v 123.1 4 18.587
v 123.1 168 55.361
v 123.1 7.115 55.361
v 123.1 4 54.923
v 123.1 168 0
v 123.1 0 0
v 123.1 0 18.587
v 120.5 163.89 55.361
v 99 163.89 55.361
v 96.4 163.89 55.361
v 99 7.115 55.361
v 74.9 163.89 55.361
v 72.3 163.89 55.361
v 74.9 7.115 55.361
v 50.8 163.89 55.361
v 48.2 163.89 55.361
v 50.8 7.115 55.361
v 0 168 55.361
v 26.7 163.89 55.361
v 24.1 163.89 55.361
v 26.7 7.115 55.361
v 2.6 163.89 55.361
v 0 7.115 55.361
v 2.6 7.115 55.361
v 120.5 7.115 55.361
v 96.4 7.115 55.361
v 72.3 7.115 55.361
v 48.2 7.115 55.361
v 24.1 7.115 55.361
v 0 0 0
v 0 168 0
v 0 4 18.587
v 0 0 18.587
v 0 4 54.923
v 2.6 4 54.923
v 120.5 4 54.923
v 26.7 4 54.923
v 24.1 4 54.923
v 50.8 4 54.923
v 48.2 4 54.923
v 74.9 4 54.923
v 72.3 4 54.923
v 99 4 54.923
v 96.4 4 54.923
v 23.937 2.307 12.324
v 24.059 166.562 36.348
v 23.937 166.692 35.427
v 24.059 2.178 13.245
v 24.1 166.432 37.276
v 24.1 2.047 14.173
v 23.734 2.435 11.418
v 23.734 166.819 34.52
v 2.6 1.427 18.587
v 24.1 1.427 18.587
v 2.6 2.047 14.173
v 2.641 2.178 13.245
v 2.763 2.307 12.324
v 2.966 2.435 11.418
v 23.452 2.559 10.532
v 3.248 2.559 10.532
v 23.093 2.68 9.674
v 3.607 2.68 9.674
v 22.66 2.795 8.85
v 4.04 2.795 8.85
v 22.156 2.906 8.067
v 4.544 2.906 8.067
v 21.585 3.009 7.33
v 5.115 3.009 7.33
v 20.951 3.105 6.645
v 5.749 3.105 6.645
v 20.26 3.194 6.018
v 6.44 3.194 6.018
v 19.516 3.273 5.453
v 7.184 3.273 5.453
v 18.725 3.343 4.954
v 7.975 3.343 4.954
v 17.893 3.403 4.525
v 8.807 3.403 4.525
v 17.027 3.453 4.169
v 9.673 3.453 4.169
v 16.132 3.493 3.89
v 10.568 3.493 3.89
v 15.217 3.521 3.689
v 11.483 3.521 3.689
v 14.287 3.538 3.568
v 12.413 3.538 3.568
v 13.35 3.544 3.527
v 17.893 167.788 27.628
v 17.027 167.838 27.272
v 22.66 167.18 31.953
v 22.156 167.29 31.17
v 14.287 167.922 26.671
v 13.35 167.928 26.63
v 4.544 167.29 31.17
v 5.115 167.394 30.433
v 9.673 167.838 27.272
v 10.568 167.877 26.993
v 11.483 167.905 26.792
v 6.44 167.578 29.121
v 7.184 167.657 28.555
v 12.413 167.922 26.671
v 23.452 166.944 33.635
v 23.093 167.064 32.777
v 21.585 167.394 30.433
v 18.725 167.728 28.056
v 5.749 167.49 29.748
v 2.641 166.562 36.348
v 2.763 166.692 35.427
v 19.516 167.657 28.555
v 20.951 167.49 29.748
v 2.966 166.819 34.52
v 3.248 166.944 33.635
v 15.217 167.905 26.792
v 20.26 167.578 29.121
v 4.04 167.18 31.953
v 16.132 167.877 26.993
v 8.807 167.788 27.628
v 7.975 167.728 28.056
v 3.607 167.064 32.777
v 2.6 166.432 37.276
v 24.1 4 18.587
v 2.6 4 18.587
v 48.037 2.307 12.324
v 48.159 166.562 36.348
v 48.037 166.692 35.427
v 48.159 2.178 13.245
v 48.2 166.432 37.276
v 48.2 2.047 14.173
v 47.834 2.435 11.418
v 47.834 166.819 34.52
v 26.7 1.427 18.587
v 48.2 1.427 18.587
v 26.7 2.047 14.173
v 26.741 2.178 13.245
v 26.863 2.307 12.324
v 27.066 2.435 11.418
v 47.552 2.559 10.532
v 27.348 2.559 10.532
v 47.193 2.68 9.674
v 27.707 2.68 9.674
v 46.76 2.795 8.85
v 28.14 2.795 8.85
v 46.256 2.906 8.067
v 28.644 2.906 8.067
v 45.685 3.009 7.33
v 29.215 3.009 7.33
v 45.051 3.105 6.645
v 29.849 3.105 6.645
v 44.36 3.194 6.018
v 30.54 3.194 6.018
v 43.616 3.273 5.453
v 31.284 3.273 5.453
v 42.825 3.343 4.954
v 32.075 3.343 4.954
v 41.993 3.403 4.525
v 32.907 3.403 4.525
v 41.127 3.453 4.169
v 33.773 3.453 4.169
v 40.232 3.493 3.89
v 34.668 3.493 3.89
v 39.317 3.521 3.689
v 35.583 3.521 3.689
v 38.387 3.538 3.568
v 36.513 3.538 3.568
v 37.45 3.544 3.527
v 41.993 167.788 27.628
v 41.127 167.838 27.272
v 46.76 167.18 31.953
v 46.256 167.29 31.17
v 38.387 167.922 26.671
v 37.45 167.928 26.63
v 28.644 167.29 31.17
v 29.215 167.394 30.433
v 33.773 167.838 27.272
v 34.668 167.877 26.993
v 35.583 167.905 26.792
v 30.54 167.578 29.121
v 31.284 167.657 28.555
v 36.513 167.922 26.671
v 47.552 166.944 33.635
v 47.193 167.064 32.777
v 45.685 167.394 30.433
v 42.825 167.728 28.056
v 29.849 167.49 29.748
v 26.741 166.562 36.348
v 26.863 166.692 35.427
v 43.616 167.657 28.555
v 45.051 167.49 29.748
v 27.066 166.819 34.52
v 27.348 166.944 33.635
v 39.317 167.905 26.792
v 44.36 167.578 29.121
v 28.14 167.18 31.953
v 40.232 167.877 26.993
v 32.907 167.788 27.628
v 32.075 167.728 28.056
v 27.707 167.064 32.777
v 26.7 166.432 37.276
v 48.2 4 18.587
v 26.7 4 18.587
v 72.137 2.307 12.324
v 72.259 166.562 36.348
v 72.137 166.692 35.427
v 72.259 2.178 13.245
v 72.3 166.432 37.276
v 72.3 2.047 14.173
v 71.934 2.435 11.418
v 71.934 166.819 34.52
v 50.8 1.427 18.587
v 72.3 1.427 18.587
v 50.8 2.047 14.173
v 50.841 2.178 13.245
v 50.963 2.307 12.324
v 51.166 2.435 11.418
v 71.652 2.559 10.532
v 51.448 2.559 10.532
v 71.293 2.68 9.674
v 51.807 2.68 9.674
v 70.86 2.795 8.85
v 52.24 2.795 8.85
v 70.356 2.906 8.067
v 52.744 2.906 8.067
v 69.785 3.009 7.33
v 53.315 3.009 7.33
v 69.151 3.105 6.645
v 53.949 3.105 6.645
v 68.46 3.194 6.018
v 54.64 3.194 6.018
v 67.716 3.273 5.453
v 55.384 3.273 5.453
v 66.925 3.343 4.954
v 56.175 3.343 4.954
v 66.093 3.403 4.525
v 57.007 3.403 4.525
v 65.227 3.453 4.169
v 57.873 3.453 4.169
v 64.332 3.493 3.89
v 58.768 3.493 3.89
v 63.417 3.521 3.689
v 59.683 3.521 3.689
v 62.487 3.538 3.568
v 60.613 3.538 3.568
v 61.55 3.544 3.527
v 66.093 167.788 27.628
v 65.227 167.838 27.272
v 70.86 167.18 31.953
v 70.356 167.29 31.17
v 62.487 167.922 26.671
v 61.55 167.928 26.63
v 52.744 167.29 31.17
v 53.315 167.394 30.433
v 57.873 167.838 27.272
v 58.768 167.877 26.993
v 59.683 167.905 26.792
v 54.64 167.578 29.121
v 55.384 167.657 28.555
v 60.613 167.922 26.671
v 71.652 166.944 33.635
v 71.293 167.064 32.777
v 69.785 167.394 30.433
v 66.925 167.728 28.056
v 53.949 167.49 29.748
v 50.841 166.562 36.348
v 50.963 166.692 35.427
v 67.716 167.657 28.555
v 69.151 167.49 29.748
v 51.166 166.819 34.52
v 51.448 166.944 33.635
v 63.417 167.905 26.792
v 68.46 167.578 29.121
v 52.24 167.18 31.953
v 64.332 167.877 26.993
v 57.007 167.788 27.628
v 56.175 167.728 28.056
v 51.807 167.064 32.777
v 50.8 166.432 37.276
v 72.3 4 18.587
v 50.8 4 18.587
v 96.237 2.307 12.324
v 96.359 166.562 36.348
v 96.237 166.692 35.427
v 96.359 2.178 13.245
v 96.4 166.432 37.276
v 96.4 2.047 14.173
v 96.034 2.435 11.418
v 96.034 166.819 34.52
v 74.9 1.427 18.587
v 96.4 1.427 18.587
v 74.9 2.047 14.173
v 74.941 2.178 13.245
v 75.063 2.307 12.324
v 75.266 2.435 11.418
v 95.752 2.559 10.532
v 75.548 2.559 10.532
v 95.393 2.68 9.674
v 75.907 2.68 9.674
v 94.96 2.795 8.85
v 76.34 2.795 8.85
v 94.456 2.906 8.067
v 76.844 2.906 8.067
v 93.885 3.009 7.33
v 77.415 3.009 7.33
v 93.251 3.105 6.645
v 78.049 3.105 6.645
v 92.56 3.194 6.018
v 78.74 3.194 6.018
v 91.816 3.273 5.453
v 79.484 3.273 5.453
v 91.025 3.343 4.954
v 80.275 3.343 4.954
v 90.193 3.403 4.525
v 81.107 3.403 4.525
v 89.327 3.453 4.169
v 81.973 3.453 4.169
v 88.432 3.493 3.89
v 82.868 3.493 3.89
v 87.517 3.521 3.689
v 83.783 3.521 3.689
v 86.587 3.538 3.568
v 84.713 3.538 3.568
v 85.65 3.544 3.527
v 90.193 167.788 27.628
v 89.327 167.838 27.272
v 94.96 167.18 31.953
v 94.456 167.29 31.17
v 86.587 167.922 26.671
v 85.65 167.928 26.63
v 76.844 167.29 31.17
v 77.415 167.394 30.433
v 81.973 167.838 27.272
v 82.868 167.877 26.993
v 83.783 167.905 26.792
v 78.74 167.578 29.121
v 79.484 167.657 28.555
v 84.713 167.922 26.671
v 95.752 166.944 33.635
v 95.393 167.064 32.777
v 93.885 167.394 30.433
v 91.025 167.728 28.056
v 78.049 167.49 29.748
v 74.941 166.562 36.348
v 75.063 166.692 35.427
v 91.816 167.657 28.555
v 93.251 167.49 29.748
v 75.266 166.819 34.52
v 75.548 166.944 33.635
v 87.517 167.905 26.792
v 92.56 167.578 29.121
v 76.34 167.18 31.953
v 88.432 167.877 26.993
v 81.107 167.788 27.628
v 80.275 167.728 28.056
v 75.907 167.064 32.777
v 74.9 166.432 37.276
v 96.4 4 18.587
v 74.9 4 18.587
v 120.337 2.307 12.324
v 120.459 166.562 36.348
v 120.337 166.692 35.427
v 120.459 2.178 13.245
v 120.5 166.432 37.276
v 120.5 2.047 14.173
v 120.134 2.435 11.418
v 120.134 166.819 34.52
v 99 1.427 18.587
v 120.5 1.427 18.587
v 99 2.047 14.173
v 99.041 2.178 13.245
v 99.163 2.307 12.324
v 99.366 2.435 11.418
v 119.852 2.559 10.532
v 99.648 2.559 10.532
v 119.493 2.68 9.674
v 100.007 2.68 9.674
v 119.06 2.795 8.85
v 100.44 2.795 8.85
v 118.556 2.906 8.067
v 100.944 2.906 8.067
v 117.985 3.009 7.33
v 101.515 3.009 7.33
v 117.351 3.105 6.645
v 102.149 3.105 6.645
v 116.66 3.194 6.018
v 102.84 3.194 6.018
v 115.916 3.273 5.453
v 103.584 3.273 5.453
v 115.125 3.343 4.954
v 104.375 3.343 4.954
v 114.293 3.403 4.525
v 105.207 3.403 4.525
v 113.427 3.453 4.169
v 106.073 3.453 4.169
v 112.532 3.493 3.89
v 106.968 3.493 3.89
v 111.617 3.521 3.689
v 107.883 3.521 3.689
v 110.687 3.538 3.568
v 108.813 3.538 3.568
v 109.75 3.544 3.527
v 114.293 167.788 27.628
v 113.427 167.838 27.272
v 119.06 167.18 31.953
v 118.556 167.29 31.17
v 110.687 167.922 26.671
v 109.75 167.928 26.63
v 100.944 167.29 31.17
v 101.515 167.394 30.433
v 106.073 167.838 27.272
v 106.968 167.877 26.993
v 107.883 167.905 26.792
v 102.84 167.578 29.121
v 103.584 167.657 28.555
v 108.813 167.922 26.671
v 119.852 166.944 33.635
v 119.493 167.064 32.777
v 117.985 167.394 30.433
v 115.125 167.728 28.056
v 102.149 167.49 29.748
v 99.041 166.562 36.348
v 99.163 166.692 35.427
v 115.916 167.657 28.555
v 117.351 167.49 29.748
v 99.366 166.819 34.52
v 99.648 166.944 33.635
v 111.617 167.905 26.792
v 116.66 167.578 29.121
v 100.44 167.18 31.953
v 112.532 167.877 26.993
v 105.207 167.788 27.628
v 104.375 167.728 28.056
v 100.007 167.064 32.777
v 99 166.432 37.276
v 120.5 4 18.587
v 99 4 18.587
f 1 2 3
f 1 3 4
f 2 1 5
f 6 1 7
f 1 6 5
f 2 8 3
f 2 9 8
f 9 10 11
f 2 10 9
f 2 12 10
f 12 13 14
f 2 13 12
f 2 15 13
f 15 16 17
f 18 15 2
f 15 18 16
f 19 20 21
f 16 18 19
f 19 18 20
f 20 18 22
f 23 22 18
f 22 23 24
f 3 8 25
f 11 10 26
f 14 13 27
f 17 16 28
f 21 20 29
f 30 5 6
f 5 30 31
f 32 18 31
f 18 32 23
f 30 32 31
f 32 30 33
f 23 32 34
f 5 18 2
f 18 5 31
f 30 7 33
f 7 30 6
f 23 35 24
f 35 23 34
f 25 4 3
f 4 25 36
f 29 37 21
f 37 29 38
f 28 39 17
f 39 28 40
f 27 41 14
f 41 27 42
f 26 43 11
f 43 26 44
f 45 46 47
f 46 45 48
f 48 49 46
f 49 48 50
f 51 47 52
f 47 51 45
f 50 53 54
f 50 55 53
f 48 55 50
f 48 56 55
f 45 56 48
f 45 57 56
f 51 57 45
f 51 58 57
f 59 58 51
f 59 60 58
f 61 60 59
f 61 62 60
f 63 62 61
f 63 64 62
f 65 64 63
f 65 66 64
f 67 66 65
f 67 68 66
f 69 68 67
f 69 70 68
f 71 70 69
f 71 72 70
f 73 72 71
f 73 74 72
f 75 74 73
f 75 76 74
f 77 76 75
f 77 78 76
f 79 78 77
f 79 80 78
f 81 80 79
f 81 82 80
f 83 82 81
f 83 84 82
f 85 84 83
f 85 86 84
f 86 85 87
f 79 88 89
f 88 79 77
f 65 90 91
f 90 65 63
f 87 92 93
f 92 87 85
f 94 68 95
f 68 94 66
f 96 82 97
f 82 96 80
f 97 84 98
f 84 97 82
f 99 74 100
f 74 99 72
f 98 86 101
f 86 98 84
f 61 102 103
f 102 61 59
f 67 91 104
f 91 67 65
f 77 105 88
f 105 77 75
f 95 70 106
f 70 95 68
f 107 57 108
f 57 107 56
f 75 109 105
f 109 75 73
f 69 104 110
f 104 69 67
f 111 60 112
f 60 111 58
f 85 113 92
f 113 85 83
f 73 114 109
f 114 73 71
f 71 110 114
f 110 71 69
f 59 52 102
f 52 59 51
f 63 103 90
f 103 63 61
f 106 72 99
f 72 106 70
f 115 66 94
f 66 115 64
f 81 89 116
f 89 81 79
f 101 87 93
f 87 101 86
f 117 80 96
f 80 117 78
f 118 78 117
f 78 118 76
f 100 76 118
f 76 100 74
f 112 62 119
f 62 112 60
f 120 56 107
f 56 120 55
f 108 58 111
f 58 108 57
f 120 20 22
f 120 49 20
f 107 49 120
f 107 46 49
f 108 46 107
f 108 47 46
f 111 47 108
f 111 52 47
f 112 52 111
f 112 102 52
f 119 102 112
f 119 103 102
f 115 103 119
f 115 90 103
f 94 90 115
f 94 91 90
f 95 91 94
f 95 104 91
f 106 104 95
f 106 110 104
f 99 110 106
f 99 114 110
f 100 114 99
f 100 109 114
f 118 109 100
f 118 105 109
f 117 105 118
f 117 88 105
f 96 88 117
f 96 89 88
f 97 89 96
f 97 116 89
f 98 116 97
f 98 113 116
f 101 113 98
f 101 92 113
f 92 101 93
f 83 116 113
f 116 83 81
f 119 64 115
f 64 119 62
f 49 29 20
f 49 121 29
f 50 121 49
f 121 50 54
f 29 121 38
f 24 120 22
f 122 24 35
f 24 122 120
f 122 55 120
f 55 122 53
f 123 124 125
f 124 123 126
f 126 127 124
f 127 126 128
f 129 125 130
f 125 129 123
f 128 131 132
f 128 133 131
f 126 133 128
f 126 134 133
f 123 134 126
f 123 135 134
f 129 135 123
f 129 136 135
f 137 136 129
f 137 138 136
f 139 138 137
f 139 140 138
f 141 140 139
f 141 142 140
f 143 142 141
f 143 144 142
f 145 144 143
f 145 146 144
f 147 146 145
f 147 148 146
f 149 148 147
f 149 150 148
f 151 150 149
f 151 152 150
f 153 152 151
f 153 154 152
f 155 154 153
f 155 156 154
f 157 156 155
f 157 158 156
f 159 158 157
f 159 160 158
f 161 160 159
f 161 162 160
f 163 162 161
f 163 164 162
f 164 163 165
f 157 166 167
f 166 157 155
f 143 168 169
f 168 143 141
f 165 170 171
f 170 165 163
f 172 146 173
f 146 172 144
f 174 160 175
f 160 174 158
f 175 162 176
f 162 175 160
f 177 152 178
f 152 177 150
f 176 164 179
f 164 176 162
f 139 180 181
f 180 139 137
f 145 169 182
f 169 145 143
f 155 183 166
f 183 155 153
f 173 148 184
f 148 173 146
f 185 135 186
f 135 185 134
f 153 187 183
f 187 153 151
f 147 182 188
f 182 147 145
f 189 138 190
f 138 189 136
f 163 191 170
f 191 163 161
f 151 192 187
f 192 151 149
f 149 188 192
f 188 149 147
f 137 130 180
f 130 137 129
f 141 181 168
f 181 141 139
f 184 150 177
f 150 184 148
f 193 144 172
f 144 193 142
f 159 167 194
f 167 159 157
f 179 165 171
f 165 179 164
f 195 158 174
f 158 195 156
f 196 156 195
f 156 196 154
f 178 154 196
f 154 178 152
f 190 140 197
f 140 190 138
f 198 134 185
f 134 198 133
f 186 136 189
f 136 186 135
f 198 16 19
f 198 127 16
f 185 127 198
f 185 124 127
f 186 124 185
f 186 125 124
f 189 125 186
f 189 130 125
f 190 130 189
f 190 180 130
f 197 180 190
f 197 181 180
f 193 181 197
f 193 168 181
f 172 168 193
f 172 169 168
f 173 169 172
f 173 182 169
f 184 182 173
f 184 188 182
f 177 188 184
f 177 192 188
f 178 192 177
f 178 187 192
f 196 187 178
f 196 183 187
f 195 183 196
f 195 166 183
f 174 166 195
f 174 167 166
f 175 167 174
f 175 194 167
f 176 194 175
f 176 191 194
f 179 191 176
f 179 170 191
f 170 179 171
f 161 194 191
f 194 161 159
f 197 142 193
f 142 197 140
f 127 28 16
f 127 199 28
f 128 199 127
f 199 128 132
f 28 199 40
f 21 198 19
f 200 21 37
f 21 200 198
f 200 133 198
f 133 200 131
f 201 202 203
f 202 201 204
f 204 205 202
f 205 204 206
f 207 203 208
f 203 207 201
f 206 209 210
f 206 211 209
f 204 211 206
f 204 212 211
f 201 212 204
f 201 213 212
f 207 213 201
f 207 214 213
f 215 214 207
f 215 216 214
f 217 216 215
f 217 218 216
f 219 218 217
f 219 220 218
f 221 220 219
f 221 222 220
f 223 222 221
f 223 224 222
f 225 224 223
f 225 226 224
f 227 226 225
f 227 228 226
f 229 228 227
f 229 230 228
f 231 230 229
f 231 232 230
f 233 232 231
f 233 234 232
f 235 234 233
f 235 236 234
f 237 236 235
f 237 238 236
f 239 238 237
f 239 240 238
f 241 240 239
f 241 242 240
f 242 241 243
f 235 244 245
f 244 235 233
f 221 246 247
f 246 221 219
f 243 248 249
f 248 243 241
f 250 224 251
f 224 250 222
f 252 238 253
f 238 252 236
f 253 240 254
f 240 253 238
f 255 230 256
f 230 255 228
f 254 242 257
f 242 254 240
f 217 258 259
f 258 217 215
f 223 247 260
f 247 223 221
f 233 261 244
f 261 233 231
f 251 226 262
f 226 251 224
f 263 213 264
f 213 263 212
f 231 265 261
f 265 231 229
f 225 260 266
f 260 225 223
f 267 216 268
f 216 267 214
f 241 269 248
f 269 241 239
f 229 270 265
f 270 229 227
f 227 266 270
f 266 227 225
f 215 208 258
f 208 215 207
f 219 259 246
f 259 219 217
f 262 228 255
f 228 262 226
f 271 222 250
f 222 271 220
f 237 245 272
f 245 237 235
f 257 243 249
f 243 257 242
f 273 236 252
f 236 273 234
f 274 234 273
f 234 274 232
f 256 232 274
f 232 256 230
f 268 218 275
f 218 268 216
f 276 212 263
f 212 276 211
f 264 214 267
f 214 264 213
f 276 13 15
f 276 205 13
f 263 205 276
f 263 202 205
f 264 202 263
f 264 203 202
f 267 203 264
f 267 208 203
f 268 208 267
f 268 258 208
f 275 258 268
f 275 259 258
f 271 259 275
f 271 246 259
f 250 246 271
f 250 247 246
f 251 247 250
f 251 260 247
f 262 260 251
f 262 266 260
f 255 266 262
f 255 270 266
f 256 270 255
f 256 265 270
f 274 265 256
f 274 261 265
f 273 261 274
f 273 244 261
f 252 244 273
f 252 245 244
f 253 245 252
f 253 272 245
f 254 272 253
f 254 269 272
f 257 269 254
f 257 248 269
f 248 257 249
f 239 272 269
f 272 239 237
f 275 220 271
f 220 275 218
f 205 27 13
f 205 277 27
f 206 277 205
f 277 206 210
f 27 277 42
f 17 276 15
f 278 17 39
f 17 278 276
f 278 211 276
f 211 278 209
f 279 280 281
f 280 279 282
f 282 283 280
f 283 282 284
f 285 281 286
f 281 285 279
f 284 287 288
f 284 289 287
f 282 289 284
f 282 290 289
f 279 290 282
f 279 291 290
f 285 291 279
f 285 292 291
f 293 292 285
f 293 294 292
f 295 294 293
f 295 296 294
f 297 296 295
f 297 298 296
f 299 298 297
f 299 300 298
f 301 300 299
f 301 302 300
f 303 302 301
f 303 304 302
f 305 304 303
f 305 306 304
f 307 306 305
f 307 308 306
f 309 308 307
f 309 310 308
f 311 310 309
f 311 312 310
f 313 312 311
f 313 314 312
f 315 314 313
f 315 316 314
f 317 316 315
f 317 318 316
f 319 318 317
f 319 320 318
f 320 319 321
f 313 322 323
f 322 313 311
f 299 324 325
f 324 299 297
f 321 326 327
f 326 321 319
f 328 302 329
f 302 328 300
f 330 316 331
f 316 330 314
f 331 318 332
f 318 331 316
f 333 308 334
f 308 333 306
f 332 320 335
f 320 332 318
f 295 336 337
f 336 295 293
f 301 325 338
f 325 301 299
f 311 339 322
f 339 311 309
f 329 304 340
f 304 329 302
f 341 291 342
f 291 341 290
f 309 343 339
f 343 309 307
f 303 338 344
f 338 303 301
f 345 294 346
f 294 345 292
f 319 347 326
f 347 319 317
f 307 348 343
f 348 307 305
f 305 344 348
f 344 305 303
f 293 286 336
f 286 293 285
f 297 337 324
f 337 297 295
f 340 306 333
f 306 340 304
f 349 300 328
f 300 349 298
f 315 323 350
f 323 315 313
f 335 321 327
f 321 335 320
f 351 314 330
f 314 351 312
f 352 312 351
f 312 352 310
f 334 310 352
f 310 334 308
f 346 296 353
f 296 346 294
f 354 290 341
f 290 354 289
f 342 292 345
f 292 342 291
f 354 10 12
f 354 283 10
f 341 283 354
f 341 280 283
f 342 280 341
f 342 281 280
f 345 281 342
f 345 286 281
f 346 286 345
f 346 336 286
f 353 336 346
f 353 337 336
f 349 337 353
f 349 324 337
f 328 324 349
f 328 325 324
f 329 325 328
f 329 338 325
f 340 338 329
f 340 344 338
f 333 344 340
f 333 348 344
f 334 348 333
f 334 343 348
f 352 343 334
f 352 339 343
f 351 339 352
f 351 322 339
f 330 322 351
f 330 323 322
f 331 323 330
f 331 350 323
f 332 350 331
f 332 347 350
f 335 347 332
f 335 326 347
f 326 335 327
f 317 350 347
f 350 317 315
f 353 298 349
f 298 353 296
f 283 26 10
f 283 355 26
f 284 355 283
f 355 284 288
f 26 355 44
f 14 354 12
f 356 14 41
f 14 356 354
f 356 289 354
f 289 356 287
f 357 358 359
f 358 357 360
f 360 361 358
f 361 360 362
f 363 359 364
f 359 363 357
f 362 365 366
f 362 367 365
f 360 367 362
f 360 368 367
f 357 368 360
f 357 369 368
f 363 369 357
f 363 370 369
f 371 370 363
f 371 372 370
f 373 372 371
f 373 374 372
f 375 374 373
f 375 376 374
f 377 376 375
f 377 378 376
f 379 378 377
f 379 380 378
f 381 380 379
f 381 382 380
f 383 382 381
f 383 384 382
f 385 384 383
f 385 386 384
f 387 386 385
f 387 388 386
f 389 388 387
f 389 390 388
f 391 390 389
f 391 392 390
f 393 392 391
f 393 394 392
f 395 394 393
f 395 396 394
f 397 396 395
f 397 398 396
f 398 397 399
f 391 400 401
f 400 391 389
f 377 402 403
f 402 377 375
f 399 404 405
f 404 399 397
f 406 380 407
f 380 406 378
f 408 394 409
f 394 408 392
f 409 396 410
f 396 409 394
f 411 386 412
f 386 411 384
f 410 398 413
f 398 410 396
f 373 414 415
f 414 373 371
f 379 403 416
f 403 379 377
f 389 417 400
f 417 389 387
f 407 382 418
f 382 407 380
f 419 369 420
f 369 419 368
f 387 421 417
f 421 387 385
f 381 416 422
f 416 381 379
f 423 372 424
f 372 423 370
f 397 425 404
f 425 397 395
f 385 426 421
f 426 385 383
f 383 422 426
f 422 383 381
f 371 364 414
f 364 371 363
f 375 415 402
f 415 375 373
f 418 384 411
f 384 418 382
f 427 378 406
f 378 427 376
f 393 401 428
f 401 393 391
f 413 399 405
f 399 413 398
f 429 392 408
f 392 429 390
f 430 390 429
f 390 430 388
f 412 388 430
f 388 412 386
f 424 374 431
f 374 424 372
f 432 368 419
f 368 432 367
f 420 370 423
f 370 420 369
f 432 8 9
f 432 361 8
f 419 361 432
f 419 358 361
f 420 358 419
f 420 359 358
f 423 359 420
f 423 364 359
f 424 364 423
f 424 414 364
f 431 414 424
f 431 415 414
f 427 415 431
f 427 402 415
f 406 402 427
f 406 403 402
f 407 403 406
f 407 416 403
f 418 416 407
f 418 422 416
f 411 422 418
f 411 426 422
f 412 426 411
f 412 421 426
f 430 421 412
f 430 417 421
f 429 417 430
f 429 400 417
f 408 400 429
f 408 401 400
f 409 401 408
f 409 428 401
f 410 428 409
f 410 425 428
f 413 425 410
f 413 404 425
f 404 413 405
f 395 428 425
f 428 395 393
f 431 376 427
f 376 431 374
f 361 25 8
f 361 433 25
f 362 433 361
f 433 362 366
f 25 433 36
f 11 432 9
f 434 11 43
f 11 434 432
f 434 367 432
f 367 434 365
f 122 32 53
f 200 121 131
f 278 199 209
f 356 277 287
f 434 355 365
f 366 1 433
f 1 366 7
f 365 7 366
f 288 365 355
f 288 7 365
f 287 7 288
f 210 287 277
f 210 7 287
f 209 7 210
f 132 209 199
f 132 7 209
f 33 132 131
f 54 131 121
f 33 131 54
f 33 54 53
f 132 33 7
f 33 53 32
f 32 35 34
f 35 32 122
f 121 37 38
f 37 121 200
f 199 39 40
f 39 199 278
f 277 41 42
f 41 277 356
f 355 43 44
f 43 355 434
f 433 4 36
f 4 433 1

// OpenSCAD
// =============================================================================
// Peptide Injector-Pen Holder  —  parametric, gravity-feed lane rack
// =============================================================================
// Designed from Jason's hand sketch (1. SIDE / FRONT views).
//
// Concept
//   * Holds injector pens lying FLAT, one per lane.
//   * Pens are loaded from the OPEN BACK (high) end -> "insert side".
//   * Each lane floor is tilted so a pen slides forward -> "slides down".
//   * A continuous LIP across the front catches them -> "won't fall out".
//   * Pens lift straight UP and out of the front when you grab one.
//
// Print orientation: exactly as modeled (flat bottom on the bed). The incline
// is internal, so the part itself sits flat — matching how it's used.
//
// Units: millimetres.
// -----------------------------------------------------------------------------

/* [Pen being held] */
// Body diameter of one injector pen (measure across the fattest part)
pen_diameter  = 19;    // [10:0.5:35]
// Length of one pen, end to end
pen_length    = 150;   // [80:1:200]

/* [Rack layout] */
// Number of lanes (pens side by side). Sketch shows 4; 4-6 works well.
num_lanes     = 5;     // [1:1:10]
// Self-feed incline angle. Higher = slides forward more readily. 0 = flat shelf.
incline_deg   = 8;     // [0:1:25]

/* [Fit & structure] */
// Diametral clearance around the pen (looser = easier load, looser hold)
clearance     = 2.5;   // [1:0.5:6]
// Wall / divider thickness
wall          = 2.6;   // [1.6:0.2:5]
// Floor thickness under the front (thin) end of the cradle
floor_thick   = 3.0;   // [2:0.5:6]
// How far the dividers rise above each pen's cradle (keeps pens separated)
divider_rise  = 17;    // [6:1:30]
// Front catch-lip wall thickness
lip_thick     = 4;     // [2:0.5:8]
// Extra lane length behind the pen (loading runout)
back_runout   = 14;    // [0:1:40]

/* [Quality] */
$fn = 72;              // [24:8:128]

// ------------------------- derived dimensions --------------------------------
lane_w    = pen_diameter + clearance;                 // inside width of a lane
cradle_r  = lane_w / 2;                                // rounded lane bottom
lane_len  = pen_length + lip_thick + back_runout;     // front lip -> open back
rise      = lane_len * tan(incline_deg);              // total floor rise
axis_z    = floor_thick + cradle_r;                   // pen-center height (front)

top_front = floor_thick + cradle_r + divider_rise;    // divider top @ front
top_back  = top_front + rise;                          // divider top @ back

// Lip just clears the pen centre so it blocks the pen but lets you lift it out
lip_top   = axis_z + cradle_r * 0.45;

total_w   = wall * (num_lanes + 1) + num_lanes * lane_w;

// lane i (0-based) centre X
function lane_x(i) = wall + lane_w/2 + i * (lane_w + wall);

// ------------------------------- geometry ------------------------------------
module pen_holder() {
    difference() {
        outer_wedge();
        for (i = [0 : num_lanes - 1]) lane_cut(lane_x(i));
        front_lip_cut();
    }
}

// Solid block whose top slopes up from front to back (parallel to lane floors)
module outer_wedge() {
    difference() {
        cube([total_w, lane_len, top_back + 1]);
        // shave the top to the inclined plane (z = top_front + y*tan(incline))
        translate([-1, -lane_len, top_front])
            rotate([incline_deg, 0, 0])
                cube([total_w + 2, lane_len * 3, top_back + 100]);
    }
}

// One inclined, round-bottomed lane open at the back, starting behind the lip
module lane_cut(xc) {
    overshoot = 2;                       // punch fully through the back face
    L = lane_len - lip_thick + overshoot;
    translate([xc, 0, 0])
        rotate([incline_deg, 0, 0])      // tilt: back (+Y) end rides up
            translate([0, lip_thick, axis_z]) {
                // rounded cradle (lower half holds the pen)
                rotate([-90, 0, 0])
                    cylinder(h = L, r = cradle_r);
                // open slot above the cradle so the pen drops in / lifts out
                translate([-cradle_r, 0, 0])
                    cube([lane_w, L, top_back + 100]);
            }
}

// Lower the front wall down to a catch-lip that spans all lanes
module front_lip_cut() {
    translate([-1, -1, lip_top])
        cube([total_w + 2, lip_thick + 1, top_back + 100]);
}

pen_holder();

// ---- handy console readout (View > "ECHO" / compile log) --------------------
echo(str("Footprint  W x L x H (mm) = ",
         total_w, " x ", lane_len, " x ", top_back));
echo(str("Lanes = ", num_lanes, "  lane width = ", lane_w,
         "  incline = ", incline_deg, " deg  (rise ", rise, " mm)"));
